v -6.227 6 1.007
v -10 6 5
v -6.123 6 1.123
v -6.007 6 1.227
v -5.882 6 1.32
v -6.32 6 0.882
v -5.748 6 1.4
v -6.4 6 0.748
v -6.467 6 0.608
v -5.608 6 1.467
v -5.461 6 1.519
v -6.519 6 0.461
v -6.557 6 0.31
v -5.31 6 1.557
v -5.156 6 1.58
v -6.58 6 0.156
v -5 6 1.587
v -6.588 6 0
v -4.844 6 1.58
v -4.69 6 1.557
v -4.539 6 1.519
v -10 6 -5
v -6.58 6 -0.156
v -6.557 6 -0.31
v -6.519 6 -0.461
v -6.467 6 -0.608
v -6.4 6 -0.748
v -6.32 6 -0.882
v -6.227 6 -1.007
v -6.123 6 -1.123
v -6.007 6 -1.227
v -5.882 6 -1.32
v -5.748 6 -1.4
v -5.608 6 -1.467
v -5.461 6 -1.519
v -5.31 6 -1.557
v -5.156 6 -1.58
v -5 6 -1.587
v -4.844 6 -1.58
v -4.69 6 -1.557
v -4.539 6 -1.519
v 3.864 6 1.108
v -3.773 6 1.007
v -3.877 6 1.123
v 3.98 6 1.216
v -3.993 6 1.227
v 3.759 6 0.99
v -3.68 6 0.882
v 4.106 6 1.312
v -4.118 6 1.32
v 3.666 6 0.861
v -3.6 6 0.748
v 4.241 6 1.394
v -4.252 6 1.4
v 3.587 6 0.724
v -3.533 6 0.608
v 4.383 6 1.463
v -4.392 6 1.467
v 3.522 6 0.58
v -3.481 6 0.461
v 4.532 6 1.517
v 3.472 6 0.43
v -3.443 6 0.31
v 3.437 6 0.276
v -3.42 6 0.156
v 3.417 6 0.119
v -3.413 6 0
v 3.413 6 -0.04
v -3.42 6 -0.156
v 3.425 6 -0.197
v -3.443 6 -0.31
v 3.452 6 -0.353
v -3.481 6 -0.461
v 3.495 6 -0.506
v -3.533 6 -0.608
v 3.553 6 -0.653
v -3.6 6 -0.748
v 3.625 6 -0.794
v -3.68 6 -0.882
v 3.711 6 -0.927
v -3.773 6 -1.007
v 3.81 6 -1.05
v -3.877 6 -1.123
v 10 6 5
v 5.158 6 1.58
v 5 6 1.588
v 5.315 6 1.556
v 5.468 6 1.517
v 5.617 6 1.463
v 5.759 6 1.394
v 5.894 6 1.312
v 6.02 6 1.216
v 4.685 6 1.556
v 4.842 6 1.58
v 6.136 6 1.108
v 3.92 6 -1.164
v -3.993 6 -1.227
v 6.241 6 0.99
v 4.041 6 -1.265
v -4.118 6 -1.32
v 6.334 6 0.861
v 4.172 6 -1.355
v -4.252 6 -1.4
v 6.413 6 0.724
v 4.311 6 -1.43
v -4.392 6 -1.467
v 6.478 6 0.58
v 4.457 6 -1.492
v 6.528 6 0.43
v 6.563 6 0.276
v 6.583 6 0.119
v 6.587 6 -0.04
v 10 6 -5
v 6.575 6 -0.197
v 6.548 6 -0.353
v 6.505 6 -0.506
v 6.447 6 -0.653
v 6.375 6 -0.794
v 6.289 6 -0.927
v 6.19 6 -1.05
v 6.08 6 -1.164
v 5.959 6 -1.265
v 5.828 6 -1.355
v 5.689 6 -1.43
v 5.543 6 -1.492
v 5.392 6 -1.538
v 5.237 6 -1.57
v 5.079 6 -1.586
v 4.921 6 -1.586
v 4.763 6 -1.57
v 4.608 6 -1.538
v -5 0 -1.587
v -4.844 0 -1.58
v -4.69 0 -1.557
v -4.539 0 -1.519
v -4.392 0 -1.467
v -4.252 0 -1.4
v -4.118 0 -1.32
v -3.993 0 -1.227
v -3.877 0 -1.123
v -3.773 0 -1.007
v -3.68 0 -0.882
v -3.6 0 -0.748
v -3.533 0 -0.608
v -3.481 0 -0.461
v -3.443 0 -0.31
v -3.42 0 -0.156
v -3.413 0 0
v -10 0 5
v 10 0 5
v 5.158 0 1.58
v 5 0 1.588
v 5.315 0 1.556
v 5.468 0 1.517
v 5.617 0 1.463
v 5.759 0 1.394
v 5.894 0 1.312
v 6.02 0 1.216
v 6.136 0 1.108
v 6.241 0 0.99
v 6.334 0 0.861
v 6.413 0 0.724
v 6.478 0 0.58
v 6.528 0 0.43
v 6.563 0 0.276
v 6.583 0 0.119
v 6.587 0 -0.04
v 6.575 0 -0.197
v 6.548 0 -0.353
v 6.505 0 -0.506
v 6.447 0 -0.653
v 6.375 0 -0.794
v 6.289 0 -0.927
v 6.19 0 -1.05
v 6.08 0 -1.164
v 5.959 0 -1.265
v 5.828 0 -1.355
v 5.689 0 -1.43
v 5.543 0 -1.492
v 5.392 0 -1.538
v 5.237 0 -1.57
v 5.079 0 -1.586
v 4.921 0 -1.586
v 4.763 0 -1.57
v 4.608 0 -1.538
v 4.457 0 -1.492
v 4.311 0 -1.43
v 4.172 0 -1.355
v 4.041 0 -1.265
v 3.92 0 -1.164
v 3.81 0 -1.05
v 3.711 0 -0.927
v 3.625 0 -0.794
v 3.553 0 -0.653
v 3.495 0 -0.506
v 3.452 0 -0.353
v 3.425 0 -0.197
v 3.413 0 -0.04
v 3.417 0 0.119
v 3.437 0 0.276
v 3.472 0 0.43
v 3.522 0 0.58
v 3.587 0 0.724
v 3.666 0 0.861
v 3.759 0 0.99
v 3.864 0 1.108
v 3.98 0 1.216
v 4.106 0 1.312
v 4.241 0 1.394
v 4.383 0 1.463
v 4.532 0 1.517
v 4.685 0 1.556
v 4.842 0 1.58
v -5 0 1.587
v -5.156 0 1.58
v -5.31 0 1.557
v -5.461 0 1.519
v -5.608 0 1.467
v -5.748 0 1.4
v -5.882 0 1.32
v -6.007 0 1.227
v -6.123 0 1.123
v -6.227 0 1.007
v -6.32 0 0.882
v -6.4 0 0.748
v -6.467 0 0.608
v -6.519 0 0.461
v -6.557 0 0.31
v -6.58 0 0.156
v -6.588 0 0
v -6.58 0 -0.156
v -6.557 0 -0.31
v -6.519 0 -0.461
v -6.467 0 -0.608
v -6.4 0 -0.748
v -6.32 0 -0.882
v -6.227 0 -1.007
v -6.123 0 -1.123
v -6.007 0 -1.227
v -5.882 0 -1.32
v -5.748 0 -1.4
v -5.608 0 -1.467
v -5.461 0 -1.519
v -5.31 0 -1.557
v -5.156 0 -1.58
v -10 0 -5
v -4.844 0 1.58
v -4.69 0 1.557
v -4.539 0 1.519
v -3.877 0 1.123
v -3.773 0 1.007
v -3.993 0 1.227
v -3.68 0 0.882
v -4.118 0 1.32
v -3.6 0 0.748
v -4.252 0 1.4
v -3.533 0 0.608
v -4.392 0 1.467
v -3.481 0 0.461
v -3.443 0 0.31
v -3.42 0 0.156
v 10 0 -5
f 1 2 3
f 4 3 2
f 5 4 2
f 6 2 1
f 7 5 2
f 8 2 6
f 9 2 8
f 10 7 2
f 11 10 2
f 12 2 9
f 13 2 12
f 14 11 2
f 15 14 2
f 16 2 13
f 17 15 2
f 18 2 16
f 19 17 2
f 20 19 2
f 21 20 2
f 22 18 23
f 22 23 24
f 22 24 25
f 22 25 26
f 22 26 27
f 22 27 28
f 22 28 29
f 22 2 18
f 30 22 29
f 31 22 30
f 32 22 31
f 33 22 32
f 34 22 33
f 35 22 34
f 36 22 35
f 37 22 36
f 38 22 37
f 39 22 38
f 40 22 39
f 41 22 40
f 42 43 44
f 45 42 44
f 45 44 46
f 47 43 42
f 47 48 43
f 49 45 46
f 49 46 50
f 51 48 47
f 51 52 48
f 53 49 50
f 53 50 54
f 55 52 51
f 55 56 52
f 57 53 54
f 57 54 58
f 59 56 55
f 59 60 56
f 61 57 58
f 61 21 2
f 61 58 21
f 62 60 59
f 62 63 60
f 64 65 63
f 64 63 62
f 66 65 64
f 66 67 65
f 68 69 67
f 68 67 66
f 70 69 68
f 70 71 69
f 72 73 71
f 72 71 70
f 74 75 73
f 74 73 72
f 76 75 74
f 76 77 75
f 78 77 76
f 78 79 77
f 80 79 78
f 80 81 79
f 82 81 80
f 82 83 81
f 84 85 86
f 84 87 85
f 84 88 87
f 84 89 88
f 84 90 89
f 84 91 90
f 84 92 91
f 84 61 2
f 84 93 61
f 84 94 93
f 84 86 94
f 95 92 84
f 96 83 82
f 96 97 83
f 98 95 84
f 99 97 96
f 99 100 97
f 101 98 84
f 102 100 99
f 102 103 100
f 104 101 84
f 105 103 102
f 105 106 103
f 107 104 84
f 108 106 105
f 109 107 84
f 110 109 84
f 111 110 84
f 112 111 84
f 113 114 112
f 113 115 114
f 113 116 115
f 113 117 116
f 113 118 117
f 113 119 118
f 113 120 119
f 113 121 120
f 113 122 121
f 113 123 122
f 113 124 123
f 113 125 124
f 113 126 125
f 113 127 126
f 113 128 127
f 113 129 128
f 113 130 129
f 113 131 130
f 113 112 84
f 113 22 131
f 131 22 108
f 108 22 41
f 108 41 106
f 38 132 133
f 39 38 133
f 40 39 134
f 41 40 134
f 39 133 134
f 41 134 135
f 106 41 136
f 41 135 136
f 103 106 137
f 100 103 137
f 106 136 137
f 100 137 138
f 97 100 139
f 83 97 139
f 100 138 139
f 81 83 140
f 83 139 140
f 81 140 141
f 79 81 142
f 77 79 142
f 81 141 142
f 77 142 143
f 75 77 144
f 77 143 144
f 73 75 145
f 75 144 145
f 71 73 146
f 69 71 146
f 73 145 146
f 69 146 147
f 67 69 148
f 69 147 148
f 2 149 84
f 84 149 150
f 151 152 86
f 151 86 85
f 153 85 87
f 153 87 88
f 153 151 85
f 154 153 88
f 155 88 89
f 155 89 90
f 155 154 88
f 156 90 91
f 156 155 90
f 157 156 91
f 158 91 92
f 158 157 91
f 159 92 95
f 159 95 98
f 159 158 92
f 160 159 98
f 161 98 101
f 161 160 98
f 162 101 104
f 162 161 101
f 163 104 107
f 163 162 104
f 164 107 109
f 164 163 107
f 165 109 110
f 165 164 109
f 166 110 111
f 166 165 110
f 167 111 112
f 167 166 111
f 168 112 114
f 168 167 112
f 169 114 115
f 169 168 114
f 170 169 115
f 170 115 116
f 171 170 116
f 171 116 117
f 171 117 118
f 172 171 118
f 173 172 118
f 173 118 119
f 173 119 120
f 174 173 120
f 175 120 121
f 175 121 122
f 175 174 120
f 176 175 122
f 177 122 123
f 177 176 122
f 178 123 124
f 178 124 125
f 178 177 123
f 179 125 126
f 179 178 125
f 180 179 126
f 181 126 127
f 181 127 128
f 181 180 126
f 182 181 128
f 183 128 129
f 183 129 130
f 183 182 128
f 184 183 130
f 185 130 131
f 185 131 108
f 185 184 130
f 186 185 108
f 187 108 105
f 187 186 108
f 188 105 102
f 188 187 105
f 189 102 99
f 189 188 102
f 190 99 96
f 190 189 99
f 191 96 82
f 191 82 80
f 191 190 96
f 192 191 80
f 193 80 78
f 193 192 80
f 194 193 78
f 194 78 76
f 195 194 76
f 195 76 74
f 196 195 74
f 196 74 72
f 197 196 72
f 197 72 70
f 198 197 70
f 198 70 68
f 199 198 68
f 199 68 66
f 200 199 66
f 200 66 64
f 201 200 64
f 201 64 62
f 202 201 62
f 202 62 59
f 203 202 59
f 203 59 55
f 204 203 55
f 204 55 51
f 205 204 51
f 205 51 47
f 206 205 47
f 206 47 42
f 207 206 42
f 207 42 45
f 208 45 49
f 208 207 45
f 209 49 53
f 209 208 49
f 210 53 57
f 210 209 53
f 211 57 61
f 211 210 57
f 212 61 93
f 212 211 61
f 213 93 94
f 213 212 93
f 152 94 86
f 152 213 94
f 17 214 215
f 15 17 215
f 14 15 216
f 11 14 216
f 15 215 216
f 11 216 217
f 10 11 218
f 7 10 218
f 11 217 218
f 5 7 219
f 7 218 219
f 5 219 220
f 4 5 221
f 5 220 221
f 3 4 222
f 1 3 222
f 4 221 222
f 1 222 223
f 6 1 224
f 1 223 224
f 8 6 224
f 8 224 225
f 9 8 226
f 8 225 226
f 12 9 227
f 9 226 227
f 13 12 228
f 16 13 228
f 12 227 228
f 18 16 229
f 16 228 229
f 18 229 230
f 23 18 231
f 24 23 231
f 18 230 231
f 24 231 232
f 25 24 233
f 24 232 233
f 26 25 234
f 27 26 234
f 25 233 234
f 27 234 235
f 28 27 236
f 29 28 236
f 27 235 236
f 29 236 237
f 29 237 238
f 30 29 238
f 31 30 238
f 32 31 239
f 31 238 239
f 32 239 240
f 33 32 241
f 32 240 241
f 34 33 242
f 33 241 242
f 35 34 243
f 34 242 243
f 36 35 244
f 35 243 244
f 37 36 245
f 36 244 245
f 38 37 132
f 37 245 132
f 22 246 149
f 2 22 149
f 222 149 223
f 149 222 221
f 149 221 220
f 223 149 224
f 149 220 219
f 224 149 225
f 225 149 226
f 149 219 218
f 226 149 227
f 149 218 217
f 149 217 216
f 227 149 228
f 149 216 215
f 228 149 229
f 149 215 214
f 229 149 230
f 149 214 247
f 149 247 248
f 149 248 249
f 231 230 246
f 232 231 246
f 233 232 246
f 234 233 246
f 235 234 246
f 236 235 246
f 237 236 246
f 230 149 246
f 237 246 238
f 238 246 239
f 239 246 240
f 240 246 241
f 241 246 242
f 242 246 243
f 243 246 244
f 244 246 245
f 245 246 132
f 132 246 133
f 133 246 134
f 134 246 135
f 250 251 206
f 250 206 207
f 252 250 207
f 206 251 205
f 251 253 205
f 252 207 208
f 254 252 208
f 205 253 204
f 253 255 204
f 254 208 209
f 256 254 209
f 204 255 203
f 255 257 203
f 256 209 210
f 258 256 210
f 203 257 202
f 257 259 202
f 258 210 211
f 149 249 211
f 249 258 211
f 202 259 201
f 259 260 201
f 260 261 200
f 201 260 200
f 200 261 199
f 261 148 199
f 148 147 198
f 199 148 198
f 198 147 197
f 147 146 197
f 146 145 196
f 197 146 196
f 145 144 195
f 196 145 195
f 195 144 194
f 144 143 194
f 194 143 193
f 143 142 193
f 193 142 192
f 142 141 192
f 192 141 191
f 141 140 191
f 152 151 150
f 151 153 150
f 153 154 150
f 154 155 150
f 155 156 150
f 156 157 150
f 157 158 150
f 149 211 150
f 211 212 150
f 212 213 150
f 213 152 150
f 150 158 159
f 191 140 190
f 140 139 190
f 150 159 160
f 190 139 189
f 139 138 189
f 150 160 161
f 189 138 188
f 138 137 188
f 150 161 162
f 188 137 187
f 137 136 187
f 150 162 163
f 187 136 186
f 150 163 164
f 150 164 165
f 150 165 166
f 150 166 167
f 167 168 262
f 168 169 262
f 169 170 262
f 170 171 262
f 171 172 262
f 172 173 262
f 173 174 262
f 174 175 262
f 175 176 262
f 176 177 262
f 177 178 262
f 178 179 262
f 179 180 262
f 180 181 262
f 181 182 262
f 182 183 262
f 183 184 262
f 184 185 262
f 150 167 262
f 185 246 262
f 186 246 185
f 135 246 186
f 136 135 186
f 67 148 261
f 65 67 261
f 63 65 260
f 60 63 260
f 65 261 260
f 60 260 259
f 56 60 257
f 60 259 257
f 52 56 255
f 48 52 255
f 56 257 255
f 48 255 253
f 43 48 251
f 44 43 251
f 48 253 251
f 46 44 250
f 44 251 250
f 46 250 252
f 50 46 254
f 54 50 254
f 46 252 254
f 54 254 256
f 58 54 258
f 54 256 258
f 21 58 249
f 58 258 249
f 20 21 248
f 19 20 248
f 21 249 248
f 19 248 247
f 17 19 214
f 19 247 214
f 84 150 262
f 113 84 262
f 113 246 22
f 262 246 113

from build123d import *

# Parameters (mm, degrees)
SKETCH1_W           = 10
SKETCH1_H           = 10
SKETCH1_R           = 1.5875
BOSS_EXTRUDE1_DEPTH = 6


with BuildPart() as part:
    # Sketch1 → Boss-Extrude1 (new body)
    # profile 1 of 4: a face of its own
    with BuildSketch(Plane(origin=(0, 0, 0), x_dir=(1, 0, 0), z_dir=(0, 1, 0))):
        with BuildLine():
            Line((0, -5), (0, 5))
            Line((0, 5), (-5, 2.5))
            Line((-5, 2.5), (-5, 1.5875))
            ThreePointArc((-5, 1.5875), (-3.877467985, 1.122532015), (-3.4125, 0))
            ThreePointArc((-3.4125, 0), (-3.877467985, -1.122532015), (-5, -1.5875))
            Line((-5, -1.5875), (-5, -5))
            Line((-5, -5), (0, -5))
        make_face()
    # profile 2 of 4: a face of its own
    with BuildSketch(Plane(origin=(0, 0, 0), x_dir=(1, 0, 0), z_dir=(0, 1, 0))):
        with BuildLine():
            Line((-5, 2.5), (-10, 0))
            Line((-10, 0), (-10, -5))
            Line((-10, -5), (-5, -5))
            Line((-5, -5), (-5, -1.5875))
            ThreePointArc((-5, -1.5875), (-6.5875, 0), (-5, 1.5875))
            Line((-5, 1.5875), (-5, 2.5))
        make_face()
    # profile 3 of 4: a face of its own
    with BuildSketch(Plane(origin=(0, 0, 0), x_dir=(1, 0, 0), z_dir=(0, 1, 0))):
        Polygon((0, 5), (-10, 5), (-10, 0), (-5, 2.5), align=None)
    # profile 4 of 4: a face of its own
    with BuildSketch(Plane(origin=(0, 0, 0), x_dir=(1, 0, 0), z_dir=(0, 1, 0))):
        with Locations((5, 0)):
            Rectangle(SKETCH1_W, SKETCH1_H)
        with Locations(Location((5, 0, 0), (0, 0, 270))):
            Circle(SKETCH1_R, mode=Mode.SUBTRACT)
    extrude(amount=BOSS_EXTRUDE1_DEPTH)


solid = part.part
